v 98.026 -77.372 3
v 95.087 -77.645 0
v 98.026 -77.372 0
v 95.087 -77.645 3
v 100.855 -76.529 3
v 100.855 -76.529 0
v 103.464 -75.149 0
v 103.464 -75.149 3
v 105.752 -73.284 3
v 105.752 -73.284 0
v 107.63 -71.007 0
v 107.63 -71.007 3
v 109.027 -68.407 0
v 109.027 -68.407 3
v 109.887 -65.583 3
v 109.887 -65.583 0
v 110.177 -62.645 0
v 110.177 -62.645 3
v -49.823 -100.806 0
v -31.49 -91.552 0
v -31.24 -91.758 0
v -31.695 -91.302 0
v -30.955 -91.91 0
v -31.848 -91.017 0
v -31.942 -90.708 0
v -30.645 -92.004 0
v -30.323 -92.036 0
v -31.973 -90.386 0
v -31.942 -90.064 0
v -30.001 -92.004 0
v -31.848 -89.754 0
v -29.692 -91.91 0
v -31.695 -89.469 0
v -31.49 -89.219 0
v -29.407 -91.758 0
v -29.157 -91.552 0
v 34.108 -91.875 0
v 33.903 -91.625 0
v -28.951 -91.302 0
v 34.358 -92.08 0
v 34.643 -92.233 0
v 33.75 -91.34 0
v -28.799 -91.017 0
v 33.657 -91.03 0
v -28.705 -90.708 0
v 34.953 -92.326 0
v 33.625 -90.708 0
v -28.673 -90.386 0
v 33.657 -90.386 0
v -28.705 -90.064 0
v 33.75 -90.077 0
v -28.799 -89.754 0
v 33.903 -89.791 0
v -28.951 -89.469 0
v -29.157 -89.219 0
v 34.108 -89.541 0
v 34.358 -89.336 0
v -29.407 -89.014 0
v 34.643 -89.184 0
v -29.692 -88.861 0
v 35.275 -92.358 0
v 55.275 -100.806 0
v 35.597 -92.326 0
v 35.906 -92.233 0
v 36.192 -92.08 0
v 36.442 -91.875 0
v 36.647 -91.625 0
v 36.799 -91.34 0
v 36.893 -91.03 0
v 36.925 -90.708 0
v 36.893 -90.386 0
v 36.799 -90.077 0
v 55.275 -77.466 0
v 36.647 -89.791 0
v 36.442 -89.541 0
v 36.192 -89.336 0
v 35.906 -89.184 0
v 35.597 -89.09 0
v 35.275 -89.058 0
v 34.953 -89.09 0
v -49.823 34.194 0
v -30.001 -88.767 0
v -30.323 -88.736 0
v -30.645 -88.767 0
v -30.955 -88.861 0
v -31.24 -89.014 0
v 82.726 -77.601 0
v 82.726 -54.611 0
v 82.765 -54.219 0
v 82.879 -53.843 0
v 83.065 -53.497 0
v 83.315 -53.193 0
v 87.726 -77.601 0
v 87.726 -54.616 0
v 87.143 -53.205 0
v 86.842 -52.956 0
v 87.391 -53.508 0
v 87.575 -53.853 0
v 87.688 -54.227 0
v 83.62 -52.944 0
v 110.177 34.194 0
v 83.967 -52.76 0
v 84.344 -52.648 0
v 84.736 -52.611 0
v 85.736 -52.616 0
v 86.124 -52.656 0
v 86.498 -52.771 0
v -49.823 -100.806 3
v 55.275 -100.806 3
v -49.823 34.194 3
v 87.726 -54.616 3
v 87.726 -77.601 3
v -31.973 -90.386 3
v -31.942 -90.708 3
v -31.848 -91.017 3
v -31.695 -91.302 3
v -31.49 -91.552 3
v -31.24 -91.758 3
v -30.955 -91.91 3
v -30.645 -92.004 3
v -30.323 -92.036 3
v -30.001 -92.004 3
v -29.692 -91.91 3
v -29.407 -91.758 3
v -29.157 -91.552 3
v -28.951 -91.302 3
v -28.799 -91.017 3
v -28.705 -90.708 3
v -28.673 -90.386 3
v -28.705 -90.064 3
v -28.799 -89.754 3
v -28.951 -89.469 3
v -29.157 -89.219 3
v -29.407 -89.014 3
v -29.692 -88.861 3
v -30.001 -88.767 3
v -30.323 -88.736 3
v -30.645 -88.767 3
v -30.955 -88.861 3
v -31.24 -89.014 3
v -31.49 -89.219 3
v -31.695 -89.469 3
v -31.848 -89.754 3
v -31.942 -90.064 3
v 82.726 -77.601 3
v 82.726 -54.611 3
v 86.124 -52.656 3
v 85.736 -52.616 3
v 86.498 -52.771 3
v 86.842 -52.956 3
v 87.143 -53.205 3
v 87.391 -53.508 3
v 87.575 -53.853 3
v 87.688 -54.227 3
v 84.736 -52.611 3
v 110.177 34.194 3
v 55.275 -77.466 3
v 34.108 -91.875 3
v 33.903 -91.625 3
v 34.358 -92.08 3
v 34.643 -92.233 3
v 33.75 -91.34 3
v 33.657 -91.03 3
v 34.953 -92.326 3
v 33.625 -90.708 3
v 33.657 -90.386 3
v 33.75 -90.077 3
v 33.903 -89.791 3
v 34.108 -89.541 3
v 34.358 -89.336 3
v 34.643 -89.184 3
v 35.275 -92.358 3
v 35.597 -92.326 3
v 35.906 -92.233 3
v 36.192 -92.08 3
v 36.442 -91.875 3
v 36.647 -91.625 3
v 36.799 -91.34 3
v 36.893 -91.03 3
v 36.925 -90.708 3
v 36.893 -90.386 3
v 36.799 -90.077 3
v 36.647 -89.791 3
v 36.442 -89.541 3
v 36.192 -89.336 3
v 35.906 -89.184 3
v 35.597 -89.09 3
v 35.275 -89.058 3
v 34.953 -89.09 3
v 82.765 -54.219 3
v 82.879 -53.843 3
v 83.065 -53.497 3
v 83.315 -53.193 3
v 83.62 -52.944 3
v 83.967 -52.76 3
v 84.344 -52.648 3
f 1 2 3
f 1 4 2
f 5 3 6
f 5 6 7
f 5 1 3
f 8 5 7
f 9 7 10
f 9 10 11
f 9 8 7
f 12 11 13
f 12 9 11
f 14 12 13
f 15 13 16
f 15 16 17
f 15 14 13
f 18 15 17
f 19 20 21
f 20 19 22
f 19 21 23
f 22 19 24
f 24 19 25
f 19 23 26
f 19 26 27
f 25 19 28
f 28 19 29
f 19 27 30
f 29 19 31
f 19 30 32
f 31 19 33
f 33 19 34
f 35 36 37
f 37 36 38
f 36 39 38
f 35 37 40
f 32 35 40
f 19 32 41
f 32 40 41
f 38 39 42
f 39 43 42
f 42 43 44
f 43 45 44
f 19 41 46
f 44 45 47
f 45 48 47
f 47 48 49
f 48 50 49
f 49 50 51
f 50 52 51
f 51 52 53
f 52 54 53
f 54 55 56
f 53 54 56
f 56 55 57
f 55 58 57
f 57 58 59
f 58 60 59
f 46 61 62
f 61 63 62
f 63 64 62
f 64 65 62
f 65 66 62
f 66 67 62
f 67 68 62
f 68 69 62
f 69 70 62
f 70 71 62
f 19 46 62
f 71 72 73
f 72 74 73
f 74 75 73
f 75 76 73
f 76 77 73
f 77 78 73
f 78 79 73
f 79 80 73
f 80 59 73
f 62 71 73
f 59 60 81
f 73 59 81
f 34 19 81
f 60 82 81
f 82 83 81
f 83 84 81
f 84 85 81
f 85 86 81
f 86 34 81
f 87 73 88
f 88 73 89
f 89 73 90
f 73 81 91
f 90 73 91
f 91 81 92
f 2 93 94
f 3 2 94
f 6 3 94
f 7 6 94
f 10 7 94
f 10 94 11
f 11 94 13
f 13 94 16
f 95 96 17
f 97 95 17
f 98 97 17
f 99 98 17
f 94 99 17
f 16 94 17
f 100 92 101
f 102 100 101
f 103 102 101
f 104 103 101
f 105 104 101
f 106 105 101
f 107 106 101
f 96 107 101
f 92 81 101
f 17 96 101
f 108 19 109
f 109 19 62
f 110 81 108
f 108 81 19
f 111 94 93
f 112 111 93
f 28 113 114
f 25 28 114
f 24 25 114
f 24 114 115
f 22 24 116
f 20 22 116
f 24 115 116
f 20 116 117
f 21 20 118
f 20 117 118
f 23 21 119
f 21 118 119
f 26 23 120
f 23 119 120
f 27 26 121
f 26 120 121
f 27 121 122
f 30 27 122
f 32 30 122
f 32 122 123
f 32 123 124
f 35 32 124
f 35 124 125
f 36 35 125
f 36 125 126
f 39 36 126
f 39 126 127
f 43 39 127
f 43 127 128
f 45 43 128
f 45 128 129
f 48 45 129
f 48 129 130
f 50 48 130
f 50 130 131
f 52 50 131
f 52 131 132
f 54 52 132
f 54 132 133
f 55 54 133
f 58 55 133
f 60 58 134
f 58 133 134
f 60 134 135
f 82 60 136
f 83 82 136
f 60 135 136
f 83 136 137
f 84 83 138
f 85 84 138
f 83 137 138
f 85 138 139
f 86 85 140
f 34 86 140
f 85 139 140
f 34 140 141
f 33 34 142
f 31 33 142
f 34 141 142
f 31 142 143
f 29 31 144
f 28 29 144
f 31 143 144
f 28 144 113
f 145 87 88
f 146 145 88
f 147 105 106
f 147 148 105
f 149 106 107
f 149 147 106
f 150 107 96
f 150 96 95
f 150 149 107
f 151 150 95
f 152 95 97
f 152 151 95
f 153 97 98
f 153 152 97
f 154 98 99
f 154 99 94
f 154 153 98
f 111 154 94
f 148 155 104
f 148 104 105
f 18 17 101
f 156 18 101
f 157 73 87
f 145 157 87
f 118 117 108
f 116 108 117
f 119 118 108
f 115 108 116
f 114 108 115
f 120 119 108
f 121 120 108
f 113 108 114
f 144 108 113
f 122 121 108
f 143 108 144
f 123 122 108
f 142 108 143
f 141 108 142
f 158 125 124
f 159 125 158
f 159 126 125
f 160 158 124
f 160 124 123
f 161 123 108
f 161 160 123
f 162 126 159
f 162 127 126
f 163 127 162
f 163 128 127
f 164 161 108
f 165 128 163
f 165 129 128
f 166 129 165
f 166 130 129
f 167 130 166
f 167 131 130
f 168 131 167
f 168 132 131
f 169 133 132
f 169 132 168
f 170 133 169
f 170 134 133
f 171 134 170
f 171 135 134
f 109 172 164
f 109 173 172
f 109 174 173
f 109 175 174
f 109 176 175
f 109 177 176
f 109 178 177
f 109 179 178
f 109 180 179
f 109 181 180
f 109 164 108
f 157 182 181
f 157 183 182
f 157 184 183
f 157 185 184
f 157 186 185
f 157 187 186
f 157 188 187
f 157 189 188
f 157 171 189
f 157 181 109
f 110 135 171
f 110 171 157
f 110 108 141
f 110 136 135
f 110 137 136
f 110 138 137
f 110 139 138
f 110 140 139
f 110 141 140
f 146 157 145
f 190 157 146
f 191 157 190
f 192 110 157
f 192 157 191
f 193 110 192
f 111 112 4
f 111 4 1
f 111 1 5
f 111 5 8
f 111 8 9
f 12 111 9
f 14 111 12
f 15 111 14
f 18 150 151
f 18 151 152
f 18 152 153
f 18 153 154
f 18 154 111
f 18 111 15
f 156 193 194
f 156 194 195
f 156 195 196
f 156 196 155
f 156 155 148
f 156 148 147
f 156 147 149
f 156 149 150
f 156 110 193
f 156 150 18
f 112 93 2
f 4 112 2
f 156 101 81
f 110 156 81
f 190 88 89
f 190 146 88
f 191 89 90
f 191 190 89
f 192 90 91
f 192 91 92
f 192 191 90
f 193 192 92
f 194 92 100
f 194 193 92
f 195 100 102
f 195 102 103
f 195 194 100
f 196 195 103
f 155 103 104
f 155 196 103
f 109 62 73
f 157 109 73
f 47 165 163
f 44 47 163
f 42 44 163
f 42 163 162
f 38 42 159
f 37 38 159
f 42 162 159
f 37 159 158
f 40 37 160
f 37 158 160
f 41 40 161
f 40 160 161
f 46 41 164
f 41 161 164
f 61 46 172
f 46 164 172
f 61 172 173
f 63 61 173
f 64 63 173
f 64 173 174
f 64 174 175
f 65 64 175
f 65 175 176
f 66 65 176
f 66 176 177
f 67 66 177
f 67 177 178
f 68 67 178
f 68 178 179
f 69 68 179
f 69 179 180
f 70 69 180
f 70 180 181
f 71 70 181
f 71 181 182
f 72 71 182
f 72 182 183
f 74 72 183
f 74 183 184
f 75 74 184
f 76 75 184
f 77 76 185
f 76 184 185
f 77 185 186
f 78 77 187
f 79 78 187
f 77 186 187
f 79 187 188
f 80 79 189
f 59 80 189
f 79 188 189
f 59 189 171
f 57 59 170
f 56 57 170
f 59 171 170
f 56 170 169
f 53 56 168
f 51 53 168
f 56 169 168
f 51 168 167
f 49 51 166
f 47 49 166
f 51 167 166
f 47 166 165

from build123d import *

# Parameters (mm, degrees)
F1_DEPTH = 3
F2_R     = 2
F3_R     = 2
F4_D     = 3.3
F5_R     = 15


with BuildPart() as f1:
    # F0 (on Top) → F1 (new body)
    with BuildSketch(Plane.XY):
        Polygon((110.177106271, 34.1935047355), (-49.822893729, 34.1935047355), (-49.822893729, -100.8064952645), (55.2746254304, -100.8064952645), (55.2746254304, -77.4659737945), (82.7258658507, -77.6009281682), (82.7258658507, -52.6009281682), (87.7258054305, -52.6255086135), (87.7258054305, -77.6009281682), (110.177106271, -77.7358825419), align=None)
    extrude(amount=F1_DEPTH)

    # F2
    f2_edges = [f1.edges().sort_by_distance(p)[0] for p in [
        (82.725866, -52.600928, 1.5),
    ]]
    fillet(f2_edges, radius=F2_R)

    # F3
    f3_edges = [f1.edges().sort_by_distance(p)[0] for p in [
        (87.725805, -52.625509, 1.5),
    ]]
    fillet(f3_edges, radius=F3_R)

    # F4 (through all)
    with Locations(Plane(origin=(0, 0, 0), x_dir=(1, 0, 0), z_dir=(0, 0, -1))):
        with Locations((-30.323264641, 90.3856833279), (35.2748671111, 90.7081734832)):
            Hole(F4_D / 2)

    # F5
    f5_edges = [f1.edges().sort_by_distance(p)[0] for p in [
        (110.177106, -77.735883, 1.5),
    ]]
    fillet(f5_edges, radius=F5_R)


solid = f1.part
